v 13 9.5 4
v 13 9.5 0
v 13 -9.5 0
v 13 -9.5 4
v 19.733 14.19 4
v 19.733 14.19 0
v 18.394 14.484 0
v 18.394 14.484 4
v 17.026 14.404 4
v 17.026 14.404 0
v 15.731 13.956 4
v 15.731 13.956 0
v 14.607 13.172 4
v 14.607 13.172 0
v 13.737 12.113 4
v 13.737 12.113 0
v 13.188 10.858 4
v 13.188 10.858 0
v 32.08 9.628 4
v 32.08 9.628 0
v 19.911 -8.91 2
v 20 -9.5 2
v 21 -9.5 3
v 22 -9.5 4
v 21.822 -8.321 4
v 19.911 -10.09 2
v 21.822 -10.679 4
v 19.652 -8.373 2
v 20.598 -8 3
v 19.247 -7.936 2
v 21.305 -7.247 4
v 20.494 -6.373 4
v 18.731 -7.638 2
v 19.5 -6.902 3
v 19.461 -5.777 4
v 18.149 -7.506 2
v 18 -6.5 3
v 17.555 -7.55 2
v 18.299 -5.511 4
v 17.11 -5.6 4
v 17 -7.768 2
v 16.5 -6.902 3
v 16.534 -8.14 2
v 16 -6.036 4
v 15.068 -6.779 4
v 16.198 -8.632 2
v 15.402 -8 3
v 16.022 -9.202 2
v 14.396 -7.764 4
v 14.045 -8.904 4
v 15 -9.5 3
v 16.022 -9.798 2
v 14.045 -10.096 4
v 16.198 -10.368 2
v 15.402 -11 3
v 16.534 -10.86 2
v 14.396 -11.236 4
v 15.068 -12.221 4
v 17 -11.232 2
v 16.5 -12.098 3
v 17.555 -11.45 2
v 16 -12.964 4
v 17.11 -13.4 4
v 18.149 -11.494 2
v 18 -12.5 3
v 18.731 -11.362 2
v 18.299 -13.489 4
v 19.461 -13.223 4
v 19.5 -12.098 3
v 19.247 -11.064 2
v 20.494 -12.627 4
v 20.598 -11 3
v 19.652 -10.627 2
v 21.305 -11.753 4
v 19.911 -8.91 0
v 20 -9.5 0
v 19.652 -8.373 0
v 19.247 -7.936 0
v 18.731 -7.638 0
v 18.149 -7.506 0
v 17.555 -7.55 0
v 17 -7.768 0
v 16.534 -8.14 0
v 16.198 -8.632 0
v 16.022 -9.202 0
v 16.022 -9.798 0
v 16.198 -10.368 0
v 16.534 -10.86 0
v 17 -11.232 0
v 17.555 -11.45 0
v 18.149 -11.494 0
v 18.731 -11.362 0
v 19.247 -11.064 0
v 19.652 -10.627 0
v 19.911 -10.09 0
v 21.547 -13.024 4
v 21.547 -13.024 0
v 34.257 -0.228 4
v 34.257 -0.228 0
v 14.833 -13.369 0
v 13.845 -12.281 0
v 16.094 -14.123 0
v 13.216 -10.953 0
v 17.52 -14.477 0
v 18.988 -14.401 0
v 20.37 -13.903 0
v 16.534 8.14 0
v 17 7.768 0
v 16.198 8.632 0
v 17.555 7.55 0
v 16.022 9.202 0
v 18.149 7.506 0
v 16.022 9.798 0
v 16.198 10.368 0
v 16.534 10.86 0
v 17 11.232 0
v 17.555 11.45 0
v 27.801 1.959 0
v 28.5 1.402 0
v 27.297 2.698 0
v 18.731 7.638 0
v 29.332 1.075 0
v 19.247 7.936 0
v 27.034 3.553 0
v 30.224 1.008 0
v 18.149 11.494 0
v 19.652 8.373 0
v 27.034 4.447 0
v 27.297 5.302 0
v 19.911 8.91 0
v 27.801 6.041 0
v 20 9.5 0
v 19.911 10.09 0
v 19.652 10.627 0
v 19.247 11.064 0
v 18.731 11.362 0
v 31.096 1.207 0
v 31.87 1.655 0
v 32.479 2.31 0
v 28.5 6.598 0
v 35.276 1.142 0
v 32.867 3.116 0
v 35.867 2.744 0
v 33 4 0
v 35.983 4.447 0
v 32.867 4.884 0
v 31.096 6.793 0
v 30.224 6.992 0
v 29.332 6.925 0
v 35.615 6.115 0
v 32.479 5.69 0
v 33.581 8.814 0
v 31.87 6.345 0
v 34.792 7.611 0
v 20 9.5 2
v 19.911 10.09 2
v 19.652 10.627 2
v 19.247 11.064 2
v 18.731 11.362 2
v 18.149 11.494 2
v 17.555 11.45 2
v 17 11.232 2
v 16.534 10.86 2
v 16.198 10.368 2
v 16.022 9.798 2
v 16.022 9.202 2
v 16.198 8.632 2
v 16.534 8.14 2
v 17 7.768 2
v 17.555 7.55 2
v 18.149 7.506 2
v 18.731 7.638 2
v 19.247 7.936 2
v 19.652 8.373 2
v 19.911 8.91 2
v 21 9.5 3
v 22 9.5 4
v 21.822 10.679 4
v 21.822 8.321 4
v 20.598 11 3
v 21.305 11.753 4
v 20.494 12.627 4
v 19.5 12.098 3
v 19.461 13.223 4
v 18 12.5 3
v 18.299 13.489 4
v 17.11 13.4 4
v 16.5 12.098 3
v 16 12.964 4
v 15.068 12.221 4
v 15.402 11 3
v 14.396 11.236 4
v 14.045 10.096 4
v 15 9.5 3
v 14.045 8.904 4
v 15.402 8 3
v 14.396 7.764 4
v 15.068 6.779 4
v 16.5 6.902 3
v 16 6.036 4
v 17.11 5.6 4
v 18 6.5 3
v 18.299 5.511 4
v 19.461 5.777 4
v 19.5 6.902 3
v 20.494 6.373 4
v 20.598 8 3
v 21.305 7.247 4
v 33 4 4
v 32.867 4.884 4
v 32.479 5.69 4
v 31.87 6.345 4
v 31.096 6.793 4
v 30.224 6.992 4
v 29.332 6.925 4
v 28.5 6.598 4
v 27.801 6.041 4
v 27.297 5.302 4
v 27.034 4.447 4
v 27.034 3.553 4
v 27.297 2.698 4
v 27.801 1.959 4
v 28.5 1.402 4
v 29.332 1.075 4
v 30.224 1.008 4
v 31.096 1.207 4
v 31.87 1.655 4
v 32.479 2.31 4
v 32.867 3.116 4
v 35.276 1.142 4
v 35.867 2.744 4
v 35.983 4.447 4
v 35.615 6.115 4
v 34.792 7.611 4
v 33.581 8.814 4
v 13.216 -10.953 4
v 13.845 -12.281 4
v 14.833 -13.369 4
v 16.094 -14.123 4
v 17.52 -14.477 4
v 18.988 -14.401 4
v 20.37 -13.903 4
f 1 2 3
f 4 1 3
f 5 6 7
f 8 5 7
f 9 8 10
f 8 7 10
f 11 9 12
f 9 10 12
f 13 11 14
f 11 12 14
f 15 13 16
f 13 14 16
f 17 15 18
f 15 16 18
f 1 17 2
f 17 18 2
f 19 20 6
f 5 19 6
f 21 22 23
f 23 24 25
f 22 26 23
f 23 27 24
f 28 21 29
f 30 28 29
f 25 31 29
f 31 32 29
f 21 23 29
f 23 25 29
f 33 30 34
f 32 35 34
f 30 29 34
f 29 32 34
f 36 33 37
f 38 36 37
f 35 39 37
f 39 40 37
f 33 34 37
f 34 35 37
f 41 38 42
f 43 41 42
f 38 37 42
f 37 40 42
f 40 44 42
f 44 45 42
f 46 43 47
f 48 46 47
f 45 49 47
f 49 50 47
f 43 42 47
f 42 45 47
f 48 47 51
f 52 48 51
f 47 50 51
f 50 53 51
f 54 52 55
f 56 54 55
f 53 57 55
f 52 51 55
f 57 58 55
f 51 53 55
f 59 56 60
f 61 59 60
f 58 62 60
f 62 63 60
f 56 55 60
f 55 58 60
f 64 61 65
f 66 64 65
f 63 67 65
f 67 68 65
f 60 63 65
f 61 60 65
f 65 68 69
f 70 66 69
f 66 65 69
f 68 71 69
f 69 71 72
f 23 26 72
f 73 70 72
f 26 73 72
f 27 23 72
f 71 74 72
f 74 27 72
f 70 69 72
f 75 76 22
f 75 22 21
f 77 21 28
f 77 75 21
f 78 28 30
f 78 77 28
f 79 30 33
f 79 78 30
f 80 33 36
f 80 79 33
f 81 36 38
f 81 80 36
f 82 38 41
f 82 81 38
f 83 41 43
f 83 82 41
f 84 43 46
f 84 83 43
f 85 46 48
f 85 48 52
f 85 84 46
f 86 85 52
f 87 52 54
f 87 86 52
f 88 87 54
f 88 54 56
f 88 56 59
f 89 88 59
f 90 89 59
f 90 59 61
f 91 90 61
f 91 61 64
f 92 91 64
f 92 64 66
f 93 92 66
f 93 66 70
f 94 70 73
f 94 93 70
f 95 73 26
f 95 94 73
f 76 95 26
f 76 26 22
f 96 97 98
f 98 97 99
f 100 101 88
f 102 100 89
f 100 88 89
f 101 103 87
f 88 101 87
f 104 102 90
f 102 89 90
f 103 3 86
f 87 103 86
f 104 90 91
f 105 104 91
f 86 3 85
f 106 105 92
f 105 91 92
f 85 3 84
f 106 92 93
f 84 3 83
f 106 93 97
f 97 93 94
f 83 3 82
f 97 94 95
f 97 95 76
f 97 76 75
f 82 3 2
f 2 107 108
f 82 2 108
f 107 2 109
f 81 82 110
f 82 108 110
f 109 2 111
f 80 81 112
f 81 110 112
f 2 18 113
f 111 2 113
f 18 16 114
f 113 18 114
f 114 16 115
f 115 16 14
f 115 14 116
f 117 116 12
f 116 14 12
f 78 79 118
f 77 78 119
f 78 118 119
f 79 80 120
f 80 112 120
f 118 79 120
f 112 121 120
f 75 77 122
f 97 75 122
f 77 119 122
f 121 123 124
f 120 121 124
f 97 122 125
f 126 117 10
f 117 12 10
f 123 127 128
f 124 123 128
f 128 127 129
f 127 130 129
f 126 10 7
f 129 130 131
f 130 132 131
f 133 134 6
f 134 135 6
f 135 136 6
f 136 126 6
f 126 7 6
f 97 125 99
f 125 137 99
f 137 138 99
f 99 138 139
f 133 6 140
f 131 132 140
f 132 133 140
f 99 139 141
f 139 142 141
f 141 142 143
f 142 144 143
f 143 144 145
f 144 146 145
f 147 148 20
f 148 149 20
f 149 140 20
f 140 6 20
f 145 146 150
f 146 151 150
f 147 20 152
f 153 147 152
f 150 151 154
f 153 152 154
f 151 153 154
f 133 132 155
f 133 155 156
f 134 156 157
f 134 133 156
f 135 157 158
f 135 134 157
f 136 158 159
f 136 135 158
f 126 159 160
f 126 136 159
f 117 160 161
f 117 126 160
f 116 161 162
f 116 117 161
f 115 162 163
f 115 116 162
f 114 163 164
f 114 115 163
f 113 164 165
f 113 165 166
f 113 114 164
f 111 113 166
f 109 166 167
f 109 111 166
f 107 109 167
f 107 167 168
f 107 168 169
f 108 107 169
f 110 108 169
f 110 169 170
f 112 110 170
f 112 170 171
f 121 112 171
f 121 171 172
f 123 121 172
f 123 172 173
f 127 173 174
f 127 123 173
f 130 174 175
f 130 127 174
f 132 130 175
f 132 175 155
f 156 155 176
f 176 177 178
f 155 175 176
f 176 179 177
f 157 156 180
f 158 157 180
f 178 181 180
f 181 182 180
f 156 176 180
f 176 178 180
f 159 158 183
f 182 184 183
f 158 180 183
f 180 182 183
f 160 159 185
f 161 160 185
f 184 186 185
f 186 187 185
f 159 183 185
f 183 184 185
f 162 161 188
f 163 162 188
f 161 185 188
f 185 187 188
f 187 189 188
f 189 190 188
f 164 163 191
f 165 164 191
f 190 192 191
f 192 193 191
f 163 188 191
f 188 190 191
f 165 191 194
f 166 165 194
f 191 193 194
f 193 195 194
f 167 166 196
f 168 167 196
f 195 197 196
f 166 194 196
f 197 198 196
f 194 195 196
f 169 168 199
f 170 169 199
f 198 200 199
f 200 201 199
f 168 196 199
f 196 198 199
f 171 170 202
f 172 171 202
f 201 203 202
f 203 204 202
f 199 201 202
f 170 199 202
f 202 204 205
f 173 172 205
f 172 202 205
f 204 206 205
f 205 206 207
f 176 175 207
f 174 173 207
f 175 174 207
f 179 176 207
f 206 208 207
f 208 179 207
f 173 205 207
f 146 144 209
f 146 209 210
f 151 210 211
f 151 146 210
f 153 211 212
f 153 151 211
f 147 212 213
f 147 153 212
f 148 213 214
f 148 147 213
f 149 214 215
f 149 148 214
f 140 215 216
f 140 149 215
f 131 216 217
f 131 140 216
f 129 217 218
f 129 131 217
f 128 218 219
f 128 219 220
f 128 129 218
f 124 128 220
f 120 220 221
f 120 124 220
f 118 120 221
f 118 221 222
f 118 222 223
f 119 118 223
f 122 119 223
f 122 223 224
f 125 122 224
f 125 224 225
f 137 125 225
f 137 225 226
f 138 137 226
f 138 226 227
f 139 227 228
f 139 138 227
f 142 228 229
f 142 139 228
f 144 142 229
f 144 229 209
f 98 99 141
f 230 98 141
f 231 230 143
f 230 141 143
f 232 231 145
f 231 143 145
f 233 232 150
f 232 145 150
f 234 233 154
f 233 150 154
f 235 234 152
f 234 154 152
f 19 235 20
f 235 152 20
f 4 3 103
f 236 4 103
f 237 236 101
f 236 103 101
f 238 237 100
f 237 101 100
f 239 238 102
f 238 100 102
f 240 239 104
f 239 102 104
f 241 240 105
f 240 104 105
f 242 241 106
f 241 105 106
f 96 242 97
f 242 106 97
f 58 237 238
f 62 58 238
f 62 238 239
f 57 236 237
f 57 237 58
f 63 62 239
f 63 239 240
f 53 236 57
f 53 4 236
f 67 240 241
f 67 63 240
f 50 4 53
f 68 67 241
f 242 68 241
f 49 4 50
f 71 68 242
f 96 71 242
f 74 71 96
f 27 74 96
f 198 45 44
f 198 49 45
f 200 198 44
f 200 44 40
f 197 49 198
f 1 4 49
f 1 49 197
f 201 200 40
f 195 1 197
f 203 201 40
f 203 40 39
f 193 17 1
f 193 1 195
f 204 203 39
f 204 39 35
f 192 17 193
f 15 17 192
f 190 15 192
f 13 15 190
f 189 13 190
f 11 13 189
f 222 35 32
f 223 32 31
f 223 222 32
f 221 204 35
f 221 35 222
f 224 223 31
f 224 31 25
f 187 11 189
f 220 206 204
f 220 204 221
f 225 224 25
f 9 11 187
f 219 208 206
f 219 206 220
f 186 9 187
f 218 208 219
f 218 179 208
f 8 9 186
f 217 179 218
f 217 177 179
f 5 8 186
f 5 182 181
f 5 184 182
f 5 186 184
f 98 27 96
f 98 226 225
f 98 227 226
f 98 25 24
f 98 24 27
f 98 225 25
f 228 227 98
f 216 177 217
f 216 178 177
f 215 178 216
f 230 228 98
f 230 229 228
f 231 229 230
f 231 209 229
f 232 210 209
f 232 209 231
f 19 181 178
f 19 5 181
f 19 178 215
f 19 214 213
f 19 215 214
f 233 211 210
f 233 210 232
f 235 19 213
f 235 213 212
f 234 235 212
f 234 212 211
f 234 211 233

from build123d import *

# Parameters (mm, degrees)
SKETCH_1_R      = 2
SKETCH_1_R_2    = 3
EXTRUDE_1_DEPTH = 4
CHAMFER_1_SIZE  = 2


with BuildPart() as part:
    # 草图1 → 凸台-拉伸1 (new body)
    with BuildSketch(Plane.XY):
        with BuildLine():
            Line((13, 9.5), (13, -9.5))
            ThreePointArc((13, -9.5), (16.094355016, -14.122609349), (21.547406878, -13.023620928))
            Line((21.547406878, -13.023620928), (34.256888253, -0.228345114))
            ThreePointArc((34.256888253, -0.228345114), (35.858751307, 5.294230708), (32.07954512, 9.628098444))
            Line((32.07954512, 9.628098444), (19.732954267, 14.190082037))
            ThreePointArc((19.732954267, 14.190082037), (15.142096164, 13.602729051), (13, 9.5))
        make_face()
        with Locations((18, 9.5)):
            Circle(SKETCH_1_R, mode=Mode.SUBTRACT)
        with Locations((18, -9.5)):
            Circle(SKETCH_1_R, mode=Mode.SUBTRACT)
        with Locations((30, 4)):
            Circle(SKETCH_1_R_2, mode=Mode.SUBTRACT)
    extrude(amount=EXTRUDE_1_DEPTH)

    # 倒角1
    chamfer_1_edges = [part.edges().sort_by_distance(p)[0] for p in [
        (16, 9.5, 4),
        (16, -9.5, 4),
    ]]
    chamfer(chamfer_1_edges, length=CHAMFER_1_SIZE)


solid = part.part
